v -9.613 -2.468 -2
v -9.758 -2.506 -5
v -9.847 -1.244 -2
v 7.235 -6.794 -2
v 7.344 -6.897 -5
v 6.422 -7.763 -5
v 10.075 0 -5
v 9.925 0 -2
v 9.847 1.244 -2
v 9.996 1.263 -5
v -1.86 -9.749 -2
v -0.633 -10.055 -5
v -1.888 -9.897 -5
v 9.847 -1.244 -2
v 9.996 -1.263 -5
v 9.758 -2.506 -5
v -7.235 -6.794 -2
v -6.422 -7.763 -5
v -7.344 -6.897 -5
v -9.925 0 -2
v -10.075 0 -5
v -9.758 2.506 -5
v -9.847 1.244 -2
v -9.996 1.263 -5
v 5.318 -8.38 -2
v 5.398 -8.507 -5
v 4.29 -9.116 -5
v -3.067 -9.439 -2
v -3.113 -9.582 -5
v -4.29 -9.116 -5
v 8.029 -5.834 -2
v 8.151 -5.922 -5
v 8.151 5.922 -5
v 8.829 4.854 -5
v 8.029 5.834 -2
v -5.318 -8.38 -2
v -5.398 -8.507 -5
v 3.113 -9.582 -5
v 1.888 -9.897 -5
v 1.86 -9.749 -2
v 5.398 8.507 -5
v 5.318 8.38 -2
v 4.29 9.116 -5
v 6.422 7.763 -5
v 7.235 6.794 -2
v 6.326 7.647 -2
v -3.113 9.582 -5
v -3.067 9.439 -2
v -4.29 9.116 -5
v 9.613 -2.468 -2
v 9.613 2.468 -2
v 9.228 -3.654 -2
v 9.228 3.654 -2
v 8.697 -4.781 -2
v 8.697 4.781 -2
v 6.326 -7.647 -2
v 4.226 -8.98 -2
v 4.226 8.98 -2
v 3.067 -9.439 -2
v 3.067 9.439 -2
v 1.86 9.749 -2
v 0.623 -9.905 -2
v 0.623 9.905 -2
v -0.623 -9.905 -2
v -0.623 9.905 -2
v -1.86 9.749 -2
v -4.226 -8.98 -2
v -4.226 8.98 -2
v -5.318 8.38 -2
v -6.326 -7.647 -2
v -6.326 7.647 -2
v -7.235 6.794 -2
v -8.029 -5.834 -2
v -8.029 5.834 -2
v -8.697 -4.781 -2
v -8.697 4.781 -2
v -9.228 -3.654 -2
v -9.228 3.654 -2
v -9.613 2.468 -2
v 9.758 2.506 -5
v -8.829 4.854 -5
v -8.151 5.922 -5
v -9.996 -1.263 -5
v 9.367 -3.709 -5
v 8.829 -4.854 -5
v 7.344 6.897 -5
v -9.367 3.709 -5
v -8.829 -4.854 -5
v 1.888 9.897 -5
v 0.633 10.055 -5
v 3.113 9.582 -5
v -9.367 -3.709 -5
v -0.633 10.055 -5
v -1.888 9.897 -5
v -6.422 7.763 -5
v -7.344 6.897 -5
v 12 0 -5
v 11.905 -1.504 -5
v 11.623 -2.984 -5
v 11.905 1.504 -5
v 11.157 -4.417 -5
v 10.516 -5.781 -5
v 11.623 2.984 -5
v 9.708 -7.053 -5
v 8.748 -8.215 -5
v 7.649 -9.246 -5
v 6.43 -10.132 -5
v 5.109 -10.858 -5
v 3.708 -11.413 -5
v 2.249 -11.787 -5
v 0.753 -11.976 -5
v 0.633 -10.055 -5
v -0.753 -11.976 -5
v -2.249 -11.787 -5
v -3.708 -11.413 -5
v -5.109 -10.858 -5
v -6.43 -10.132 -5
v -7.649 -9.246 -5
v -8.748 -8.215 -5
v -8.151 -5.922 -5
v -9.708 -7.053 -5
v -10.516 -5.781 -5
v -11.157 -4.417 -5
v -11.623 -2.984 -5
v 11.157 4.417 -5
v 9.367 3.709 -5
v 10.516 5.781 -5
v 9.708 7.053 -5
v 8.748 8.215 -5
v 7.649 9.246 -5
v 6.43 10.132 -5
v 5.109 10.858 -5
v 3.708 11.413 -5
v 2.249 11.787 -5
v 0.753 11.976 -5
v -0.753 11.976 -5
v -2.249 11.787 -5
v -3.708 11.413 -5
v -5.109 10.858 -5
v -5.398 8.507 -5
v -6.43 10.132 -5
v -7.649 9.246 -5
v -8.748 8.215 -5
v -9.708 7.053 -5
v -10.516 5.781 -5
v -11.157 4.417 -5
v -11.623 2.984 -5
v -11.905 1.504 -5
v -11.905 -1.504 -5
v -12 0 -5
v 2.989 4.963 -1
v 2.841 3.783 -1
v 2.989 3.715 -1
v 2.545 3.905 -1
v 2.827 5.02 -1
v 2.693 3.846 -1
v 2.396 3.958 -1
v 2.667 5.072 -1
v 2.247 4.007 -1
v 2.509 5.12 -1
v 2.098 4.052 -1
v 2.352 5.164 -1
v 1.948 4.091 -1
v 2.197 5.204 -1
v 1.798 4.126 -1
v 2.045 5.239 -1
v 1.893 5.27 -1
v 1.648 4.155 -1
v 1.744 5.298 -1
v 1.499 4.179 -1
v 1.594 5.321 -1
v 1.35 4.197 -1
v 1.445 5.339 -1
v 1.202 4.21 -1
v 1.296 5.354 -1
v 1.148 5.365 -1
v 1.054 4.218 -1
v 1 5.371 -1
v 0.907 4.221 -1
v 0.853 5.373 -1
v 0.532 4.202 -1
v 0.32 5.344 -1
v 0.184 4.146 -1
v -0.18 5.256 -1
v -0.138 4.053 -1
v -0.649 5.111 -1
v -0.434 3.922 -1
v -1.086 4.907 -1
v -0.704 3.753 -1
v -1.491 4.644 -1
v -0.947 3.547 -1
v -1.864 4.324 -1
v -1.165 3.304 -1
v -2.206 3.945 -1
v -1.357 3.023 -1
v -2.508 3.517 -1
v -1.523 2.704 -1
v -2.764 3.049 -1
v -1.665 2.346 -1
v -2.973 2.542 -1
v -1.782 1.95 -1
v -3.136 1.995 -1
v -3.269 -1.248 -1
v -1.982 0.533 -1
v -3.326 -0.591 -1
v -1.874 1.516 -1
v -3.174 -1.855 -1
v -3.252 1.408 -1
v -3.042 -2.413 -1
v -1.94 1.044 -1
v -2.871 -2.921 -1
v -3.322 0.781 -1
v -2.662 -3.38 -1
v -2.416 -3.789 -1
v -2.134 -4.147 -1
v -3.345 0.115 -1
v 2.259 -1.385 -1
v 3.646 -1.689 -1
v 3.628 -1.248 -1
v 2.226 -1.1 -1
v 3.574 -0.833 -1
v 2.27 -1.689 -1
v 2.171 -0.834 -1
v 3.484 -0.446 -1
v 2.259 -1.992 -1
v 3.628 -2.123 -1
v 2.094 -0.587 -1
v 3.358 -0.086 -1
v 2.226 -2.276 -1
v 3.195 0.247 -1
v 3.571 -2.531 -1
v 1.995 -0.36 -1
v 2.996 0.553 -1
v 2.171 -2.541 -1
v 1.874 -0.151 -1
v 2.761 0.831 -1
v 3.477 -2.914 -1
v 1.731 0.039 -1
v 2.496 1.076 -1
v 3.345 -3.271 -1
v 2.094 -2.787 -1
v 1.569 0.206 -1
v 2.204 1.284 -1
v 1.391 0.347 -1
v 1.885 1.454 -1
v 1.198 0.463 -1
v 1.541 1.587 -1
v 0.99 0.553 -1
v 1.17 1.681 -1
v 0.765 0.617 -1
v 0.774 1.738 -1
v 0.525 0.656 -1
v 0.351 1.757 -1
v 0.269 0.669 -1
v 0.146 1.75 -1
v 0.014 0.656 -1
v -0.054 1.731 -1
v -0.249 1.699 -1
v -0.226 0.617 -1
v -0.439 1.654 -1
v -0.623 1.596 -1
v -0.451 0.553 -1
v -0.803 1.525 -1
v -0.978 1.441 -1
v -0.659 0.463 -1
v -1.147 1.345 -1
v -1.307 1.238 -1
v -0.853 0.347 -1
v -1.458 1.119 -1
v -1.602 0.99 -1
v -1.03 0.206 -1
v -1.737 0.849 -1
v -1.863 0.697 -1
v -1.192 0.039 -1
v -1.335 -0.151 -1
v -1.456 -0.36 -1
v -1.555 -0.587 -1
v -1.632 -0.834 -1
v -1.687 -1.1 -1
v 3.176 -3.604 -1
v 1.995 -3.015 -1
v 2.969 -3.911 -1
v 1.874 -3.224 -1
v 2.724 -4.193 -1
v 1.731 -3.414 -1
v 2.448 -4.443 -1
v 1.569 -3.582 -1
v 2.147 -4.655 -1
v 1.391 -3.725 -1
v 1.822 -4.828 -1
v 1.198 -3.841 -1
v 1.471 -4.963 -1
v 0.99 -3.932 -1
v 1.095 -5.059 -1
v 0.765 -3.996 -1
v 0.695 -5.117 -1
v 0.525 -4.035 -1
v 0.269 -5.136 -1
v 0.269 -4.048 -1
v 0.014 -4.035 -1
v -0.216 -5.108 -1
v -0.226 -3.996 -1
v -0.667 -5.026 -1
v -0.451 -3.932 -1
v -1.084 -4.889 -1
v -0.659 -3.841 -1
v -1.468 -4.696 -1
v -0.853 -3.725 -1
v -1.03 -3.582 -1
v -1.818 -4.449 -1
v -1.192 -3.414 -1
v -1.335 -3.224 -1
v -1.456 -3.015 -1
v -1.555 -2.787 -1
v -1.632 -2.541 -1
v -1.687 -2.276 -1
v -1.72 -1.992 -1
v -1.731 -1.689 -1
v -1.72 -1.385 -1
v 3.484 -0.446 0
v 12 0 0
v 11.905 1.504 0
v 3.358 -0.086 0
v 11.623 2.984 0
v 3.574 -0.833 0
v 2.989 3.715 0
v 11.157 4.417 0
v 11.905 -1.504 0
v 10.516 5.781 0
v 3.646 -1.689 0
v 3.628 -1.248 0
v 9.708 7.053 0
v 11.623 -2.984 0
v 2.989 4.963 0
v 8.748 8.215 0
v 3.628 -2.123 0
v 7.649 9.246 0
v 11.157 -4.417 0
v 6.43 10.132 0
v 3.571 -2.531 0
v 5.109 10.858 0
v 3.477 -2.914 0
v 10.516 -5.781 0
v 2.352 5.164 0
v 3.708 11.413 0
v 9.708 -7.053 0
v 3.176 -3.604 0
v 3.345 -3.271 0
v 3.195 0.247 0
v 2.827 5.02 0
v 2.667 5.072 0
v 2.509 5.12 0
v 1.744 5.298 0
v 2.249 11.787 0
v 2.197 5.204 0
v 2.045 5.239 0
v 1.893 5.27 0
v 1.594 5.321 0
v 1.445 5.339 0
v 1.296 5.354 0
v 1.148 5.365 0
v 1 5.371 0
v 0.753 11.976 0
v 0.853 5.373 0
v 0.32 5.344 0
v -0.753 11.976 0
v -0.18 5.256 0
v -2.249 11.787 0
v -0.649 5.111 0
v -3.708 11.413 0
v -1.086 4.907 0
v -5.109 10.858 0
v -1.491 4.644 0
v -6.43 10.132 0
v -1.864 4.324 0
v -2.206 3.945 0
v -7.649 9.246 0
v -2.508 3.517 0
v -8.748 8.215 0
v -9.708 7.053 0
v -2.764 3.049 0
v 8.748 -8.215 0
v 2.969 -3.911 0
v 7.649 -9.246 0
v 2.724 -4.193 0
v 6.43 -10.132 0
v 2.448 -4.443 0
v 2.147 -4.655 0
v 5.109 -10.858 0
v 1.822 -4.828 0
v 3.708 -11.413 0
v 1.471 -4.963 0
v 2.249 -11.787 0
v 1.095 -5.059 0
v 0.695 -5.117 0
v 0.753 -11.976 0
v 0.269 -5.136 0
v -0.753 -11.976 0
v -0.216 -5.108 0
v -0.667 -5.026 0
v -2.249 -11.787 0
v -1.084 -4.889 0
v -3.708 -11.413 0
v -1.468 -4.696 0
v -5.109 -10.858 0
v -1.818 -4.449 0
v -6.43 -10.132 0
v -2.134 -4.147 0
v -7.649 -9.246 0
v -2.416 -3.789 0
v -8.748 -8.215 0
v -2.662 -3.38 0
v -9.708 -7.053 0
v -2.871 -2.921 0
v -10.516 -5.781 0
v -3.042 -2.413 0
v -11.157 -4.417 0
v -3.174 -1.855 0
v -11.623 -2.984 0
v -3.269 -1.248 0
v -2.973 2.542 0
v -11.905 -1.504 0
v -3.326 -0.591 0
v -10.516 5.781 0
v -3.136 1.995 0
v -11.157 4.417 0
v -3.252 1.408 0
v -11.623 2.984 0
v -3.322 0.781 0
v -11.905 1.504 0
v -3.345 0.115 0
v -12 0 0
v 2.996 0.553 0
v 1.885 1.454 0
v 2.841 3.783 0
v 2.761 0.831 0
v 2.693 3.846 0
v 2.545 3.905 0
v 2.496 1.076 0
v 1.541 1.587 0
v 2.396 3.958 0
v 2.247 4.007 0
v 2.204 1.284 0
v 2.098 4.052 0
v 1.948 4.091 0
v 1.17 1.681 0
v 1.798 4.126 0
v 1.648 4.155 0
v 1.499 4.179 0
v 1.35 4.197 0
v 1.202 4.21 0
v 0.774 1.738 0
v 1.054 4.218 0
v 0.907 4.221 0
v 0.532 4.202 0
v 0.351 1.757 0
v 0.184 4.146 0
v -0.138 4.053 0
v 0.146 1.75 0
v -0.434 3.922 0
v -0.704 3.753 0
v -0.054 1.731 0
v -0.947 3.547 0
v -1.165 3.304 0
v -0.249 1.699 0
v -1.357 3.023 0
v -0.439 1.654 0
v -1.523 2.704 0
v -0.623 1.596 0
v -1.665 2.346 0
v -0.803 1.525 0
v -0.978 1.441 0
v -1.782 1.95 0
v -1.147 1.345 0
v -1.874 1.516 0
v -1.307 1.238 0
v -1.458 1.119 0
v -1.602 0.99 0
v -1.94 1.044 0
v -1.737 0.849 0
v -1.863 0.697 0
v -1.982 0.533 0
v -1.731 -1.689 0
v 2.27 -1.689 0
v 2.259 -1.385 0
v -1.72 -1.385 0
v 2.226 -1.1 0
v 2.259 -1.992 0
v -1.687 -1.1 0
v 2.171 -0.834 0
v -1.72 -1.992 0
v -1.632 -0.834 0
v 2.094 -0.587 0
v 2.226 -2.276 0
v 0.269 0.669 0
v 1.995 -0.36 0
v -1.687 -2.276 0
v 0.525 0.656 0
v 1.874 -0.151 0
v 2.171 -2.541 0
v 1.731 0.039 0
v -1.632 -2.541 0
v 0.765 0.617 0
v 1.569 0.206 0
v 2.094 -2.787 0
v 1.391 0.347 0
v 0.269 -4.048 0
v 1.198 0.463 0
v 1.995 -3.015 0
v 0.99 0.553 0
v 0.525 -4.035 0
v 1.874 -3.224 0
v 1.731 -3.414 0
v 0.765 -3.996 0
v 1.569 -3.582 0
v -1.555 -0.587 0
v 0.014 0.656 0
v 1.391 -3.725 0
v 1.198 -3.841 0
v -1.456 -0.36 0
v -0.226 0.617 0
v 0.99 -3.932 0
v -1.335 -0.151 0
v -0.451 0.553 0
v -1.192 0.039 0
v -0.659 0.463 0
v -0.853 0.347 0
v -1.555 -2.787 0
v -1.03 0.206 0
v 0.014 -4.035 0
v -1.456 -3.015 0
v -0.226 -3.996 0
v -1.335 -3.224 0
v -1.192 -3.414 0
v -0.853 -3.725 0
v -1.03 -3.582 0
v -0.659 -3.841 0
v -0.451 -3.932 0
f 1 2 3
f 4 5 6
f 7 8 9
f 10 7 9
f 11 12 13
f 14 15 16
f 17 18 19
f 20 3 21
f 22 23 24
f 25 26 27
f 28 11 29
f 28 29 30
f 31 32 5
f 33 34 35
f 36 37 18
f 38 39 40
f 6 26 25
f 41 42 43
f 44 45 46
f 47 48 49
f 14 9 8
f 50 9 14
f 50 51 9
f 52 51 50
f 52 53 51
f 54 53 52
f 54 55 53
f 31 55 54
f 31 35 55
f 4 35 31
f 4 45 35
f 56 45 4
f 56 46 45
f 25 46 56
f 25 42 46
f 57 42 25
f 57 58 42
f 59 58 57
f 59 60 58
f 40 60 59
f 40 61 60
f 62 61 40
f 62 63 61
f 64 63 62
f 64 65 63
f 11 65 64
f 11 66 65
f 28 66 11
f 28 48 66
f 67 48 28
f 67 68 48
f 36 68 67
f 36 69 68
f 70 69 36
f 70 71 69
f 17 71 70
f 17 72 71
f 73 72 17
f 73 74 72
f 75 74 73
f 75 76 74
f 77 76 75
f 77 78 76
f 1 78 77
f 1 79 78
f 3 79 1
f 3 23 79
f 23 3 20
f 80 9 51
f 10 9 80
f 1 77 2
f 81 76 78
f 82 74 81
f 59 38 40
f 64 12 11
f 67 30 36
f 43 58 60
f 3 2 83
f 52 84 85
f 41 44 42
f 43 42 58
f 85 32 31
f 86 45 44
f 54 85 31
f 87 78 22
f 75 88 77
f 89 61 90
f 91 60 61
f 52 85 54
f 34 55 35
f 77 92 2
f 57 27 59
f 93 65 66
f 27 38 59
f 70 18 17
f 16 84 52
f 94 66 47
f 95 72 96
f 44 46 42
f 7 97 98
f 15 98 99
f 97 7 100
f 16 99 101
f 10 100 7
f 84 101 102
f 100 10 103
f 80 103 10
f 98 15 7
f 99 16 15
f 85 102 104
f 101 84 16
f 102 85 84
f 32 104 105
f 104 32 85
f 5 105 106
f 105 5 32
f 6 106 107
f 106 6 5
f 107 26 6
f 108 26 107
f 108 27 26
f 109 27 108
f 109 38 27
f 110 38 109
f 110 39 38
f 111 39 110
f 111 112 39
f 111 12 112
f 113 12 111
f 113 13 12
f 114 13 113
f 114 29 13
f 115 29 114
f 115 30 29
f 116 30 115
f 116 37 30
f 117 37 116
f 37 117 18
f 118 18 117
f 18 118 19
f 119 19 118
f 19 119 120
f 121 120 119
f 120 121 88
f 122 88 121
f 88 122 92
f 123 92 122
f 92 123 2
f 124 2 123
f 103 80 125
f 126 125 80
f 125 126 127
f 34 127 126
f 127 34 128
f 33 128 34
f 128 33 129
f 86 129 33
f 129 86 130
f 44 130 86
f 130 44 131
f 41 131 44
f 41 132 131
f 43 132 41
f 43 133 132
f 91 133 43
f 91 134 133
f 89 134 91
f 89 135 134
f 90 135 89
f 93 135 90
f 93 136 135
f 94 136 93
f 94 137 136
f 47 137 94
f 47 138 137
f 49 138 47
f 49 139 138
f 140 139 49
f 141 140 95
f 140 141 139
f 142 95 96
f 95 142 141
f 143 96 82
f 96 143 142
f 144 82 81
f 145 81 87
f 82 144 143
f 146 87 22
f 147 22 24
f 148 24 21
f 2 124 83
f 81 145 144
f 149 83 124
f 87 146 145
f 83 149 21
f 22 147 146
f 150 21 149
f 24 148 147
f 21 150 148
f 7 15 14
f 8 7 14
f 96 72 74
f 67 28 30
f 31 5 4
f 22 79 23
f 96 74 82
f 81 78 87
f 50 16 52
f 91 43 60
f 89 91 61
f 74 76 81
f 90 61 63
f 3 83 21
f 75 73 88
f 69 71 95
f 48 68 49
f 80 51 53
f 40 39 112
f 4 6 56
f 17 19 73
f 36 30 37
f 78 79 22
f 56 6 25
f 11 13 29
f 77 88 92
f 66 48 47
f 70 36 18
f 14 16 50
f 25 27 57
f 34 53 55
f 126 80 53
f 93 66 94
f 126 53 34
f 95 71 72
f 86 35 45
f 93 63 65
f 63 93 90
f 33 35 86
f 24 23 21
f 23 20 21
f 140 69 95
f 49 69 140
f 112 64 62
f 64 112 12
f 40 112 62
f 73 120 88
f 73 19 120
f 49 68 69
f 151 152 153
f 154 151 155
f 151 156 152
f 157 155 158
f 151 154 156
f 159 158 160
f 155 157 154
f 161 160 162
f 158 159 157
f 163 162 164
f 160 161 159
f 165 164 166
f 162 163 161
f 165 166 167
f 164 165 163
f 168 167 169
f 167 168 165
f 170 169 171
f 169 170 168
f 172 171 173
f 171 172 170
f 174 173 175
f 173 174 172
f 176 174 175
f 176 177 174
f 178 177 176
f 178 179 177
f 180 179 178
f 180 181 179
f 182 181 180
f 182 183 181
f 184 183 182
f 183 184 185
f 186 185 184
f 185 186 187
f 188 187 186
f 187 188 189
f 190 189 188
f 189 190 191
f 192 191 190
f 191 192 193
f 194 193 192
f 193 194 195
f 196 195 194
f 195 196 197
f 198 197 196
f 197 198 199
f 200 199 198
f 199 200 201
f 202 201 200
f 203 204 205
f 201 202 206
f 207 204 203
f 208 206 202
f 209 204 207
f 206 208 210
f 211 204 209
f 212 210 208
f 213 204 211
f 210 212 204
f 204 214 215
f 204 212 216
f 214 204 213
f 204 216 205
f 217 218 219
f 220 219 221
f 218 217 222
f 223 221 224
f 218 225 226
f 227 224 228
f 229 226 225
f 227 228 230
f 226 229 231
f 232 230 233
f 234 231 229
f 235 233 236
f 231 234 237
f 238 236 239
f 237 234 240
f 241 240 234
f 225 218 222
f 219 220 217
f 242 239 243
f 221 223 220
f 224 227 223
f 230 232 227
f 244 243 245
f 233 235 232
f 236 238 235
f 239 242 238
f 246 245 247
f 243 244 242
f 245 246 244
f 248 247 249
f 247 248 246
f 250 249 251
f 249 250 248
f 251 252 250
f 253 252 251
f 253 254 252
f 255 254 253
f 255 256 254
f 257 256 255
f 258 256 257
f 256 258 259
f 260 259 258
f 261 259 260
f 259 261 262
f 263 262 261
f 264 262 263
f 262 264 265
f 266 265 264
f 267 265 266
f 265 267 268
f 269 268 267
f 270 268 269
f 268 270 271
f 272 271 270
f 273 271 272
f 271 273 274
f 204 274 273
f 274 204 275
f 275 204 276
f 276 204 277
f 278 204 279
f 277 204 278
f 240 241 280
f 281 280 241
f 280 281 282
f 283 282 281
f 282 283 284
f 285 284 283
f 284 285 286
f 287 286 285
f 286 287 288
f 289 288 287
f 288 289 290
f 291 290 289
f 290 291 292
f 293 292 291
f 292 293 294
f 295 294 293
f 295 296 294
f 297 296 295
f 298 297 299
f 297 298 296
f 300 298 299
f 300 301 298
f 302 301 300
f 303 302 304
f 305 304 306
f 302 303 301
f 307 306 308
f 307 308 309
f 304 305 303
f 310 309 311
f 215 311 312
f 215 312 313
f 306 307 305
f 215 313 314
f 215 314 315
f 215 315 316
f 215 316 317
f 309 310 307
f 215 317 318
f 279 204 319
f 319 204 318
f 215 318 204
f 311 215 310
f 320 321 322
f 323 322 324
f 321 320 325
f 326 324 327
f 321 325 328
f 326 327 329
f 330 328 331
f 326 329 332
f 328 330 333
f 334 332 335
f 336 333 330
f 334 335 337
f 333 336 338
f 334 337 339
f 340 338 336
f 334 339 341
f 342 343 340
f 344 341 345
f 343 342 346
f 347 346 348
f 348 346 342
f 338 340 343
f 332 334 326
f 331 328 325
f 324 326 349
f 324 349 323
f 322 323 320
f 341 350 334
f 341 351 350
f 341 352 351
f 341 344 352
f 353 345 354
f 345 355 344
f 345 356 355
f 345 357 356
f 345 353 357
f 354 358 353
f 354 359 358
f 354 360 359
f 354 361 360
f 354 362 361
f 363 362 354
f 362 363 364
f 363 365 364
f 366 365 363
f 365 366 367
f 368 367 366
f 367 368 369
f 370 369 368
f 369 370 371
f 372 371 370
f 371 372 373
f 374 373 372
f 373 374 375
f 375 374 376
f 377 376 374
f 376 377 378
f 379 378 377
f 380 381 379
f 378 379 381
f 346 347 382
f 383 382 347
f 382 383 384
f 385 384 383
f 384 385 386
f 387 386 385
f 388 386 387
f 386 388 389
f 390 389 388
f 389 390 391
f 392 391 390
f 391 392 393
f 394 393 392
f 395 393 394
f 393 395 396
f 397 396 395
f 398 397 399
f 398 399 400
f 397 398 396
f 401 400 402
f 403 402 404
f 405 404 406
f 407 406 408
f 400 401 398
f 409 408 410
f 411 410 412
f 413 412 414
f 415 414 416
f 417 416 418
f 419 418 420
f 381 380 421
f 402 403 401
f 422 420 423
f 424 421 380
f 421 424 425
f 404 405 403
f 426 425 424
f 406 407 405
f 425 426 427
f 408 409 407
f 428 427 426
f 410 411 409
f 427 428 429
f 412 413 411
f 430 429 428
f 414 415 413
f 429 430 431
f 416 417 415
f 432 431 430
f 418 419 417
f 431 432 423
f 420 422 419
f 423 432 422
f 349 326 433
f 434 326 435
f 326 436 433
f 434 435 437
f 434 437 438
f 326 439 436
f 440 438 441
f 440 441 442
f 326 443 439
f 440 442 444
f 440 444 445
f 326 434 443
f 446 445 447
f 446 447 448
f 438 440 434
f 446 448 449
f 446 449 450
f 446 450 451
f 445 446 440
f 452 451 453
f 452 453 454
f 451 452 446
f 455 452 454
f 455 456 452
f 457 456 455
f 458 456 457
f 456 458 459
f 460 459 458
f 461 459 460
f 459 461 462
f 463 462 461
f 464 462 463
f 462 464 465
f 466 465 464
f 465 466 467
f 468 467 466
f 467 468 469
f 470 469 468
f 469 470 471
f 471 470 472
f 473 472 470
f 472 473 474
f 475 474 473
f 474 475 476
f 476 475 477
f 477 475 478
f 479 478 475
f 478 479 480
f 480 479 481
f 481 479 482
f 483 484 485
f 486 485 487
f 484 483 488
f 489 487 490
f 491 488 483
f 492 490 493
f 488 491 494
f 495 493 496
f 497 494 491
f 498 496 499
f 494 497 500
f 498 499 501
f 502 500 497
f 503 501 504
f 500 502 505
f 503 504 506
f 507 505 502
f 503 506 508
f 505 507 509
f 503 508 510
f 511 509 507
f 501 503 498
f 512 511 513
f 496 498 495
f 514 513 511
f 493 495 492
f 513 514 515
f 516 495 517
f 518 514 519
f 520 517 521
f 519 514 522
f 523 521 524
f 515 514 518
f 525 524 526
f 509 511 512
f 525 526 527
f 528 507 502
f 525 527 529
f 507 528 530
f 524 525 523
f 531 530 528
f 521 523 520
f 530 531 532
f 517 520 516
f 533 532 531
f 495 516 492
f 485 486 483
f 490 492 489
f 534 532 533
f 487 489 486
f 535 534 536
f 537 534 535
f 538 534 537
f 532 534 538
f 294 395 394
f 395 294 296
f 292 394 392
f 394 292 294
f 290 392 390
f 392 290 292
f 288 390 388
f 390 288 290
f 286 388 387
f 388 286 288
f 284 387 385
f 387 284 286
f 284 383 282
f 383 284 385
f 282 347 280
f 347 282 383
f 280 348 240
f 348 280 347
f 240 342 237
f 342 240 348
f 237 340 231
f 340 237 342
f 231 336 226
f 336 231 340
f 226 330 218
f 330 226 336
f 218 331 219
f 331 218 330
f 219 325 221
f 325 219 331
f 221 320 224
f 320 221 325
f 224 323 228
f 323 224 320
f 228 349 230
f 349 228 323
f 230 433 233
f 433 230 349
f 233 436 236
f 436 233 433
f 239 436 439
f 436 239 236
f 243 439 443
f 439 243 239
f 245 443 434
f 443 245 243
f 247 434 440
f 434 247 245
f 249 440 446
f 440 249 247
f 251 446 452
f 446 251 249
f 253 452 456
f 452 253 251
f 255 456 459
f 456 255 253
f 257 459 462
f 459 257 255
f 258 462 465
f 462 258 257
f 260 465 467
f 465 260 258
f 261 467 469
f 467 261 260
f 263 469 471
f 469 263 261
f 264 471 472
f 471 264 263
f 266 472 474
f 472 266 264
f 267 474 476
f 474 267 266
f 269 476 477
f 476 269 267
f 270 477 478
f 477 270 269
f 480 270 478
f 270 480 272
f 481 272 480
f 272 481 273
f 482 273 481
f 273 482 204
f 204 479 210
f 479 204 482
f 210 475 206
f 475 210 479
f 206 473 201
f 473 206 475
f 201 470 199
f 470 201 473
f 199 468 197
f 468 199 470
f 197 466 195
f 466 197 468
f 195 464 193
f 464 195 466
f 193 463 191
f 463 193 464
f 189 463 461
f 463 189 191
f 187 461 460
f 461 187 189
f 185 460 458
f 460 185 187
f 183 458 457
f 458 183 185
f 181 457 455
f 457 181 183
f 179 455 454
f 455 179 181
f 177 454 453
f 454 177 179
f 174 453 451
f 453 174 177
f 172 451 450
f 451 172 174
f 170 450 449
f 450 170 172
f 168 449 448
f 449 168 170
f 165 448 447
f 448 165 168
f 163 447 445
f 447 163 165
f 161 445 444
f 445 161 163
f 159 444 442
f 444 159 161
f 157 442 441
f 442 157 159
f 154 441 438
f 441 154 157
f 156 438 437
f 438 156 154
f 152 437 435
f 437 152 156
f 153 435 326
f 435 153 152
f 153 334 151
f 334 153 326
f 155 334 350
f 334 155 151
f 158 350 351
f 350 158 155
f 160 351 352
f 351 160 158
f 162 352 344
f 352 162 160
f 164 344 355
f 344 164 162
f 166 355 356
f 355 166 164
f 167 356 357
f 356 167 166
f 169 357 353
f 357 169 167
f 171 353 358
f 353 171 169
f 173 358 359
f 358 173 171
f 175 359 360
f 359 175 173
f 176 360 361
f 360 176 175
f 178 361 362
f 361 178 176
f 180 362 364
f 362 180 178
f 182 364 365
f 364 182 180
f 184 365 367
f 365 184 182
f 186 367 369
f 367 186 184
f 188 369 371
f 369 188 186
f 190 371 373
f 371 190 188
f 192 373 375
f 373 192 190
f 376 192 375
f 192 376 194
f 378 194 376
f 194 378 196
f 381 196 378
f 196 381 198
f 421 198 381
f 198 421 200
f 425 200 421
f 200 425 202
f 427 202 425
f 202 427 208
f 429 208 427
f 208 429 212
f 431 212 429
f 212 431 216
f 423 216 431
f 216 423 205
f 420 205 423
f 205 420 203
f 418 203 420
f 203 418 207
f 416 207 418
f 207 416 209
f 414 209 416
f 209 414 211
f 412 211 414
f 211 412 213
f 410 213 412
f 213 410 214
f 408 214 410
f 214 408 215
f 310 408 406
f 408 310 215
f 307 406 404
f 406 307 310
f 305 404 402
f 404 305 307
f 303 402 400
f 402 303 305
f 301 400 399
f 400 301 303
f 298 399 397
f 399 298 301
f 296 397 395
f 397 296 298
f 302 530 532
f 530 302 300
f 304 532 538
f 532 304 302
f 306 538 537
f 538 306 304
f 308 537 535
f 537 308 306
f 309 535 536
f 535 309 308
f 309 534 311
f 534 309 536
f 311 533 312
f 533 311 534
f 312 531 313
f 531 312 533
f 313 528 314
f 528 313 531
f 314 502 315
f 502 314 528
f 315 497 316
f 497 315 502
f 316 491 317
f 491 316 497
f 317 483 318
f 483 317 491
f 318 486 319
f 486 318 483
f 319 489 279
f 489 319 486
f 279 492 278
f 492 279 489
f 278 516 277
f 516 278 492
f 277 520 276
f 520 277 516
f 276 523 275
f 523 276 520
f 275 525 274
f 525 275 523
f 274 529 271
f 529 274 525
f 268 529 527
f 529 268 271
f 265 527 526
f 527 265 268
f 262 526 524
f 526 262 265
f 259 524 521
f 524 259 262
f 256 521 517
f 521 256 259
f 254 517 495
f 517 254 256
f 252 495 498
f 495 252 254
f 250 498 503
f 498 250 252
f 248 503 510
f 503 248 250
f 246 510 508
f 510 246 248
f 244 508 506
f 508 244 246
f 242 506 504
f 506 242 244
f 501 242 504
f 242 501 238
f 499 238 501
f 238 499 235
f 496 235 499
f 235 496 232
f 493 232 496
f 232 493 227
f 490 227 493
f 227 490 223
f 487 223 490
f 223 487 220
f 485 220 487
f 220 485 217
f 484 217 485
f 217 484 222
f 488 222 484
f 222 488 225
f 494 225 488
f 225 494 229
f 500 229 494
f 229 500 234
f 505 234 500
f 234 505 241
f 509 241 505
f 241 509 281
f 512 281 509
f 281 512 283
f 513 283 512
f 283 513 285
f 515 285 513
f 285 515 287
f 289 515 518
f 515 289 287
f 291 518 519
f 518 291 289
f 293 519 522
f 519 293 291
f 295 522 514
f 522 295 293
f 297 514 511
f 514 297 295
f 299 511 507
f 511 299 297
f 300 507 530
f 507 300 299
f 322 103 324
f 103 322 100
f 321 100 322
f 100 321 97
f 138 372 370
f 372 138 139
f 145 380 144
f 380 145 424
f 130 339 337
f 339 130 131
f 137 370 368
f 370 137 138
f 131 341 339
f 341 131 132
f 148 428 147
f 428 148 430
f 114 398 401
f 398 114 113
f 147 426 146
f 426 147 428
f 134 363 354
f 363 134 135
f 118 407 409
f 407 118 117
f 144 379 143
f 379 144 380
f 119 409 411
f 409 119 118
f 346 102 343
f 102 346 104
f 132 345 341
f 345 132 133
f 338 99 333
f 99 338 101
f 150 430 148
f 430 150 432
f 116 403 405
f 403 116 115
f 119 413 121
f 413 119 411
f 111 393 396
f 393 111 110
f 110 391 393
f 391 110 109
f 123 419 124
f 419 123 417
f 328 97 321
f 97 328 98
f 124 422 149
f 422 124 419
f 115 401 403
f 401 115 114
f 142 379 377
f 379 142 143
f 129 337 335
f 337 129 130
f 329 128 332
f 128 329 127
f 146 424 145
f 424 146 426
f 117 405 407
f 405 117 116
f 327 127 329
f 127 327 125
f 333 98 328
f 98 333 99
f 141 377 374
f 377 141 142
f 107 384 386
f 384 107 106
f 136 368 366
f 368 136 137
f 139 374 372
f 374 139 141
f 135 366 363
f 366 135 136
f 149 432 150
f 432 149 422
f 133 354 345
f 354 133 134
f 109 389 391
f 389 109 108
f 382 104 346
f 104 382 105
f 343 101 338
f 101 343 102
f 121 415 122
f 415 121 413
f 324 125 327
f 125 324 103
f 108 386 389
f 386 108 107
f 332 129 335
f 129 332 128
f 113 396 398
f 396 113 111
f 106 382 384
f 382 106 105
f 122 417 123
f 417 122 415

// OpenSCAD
$fn = 50;


difference() {
	union() {
		translate(v = [0, 0, -5.0000000000]) {
			cylinder(h = 5, r = 12.0000000000);
		}
	}
	union() {
		#translate(v = [0, 0, -5.0000000000]) {
			cylinder(h = 3, r1 = 10.0750000000, r2 = 9.9250000000);
		}
		translate(v = [0, 0, -1]) {
			linear_extrude(height = 1) {
				text(font = "Impact", halign = "center", size = 10, text = "6", valign = "center");
			}
		}
	}
}
